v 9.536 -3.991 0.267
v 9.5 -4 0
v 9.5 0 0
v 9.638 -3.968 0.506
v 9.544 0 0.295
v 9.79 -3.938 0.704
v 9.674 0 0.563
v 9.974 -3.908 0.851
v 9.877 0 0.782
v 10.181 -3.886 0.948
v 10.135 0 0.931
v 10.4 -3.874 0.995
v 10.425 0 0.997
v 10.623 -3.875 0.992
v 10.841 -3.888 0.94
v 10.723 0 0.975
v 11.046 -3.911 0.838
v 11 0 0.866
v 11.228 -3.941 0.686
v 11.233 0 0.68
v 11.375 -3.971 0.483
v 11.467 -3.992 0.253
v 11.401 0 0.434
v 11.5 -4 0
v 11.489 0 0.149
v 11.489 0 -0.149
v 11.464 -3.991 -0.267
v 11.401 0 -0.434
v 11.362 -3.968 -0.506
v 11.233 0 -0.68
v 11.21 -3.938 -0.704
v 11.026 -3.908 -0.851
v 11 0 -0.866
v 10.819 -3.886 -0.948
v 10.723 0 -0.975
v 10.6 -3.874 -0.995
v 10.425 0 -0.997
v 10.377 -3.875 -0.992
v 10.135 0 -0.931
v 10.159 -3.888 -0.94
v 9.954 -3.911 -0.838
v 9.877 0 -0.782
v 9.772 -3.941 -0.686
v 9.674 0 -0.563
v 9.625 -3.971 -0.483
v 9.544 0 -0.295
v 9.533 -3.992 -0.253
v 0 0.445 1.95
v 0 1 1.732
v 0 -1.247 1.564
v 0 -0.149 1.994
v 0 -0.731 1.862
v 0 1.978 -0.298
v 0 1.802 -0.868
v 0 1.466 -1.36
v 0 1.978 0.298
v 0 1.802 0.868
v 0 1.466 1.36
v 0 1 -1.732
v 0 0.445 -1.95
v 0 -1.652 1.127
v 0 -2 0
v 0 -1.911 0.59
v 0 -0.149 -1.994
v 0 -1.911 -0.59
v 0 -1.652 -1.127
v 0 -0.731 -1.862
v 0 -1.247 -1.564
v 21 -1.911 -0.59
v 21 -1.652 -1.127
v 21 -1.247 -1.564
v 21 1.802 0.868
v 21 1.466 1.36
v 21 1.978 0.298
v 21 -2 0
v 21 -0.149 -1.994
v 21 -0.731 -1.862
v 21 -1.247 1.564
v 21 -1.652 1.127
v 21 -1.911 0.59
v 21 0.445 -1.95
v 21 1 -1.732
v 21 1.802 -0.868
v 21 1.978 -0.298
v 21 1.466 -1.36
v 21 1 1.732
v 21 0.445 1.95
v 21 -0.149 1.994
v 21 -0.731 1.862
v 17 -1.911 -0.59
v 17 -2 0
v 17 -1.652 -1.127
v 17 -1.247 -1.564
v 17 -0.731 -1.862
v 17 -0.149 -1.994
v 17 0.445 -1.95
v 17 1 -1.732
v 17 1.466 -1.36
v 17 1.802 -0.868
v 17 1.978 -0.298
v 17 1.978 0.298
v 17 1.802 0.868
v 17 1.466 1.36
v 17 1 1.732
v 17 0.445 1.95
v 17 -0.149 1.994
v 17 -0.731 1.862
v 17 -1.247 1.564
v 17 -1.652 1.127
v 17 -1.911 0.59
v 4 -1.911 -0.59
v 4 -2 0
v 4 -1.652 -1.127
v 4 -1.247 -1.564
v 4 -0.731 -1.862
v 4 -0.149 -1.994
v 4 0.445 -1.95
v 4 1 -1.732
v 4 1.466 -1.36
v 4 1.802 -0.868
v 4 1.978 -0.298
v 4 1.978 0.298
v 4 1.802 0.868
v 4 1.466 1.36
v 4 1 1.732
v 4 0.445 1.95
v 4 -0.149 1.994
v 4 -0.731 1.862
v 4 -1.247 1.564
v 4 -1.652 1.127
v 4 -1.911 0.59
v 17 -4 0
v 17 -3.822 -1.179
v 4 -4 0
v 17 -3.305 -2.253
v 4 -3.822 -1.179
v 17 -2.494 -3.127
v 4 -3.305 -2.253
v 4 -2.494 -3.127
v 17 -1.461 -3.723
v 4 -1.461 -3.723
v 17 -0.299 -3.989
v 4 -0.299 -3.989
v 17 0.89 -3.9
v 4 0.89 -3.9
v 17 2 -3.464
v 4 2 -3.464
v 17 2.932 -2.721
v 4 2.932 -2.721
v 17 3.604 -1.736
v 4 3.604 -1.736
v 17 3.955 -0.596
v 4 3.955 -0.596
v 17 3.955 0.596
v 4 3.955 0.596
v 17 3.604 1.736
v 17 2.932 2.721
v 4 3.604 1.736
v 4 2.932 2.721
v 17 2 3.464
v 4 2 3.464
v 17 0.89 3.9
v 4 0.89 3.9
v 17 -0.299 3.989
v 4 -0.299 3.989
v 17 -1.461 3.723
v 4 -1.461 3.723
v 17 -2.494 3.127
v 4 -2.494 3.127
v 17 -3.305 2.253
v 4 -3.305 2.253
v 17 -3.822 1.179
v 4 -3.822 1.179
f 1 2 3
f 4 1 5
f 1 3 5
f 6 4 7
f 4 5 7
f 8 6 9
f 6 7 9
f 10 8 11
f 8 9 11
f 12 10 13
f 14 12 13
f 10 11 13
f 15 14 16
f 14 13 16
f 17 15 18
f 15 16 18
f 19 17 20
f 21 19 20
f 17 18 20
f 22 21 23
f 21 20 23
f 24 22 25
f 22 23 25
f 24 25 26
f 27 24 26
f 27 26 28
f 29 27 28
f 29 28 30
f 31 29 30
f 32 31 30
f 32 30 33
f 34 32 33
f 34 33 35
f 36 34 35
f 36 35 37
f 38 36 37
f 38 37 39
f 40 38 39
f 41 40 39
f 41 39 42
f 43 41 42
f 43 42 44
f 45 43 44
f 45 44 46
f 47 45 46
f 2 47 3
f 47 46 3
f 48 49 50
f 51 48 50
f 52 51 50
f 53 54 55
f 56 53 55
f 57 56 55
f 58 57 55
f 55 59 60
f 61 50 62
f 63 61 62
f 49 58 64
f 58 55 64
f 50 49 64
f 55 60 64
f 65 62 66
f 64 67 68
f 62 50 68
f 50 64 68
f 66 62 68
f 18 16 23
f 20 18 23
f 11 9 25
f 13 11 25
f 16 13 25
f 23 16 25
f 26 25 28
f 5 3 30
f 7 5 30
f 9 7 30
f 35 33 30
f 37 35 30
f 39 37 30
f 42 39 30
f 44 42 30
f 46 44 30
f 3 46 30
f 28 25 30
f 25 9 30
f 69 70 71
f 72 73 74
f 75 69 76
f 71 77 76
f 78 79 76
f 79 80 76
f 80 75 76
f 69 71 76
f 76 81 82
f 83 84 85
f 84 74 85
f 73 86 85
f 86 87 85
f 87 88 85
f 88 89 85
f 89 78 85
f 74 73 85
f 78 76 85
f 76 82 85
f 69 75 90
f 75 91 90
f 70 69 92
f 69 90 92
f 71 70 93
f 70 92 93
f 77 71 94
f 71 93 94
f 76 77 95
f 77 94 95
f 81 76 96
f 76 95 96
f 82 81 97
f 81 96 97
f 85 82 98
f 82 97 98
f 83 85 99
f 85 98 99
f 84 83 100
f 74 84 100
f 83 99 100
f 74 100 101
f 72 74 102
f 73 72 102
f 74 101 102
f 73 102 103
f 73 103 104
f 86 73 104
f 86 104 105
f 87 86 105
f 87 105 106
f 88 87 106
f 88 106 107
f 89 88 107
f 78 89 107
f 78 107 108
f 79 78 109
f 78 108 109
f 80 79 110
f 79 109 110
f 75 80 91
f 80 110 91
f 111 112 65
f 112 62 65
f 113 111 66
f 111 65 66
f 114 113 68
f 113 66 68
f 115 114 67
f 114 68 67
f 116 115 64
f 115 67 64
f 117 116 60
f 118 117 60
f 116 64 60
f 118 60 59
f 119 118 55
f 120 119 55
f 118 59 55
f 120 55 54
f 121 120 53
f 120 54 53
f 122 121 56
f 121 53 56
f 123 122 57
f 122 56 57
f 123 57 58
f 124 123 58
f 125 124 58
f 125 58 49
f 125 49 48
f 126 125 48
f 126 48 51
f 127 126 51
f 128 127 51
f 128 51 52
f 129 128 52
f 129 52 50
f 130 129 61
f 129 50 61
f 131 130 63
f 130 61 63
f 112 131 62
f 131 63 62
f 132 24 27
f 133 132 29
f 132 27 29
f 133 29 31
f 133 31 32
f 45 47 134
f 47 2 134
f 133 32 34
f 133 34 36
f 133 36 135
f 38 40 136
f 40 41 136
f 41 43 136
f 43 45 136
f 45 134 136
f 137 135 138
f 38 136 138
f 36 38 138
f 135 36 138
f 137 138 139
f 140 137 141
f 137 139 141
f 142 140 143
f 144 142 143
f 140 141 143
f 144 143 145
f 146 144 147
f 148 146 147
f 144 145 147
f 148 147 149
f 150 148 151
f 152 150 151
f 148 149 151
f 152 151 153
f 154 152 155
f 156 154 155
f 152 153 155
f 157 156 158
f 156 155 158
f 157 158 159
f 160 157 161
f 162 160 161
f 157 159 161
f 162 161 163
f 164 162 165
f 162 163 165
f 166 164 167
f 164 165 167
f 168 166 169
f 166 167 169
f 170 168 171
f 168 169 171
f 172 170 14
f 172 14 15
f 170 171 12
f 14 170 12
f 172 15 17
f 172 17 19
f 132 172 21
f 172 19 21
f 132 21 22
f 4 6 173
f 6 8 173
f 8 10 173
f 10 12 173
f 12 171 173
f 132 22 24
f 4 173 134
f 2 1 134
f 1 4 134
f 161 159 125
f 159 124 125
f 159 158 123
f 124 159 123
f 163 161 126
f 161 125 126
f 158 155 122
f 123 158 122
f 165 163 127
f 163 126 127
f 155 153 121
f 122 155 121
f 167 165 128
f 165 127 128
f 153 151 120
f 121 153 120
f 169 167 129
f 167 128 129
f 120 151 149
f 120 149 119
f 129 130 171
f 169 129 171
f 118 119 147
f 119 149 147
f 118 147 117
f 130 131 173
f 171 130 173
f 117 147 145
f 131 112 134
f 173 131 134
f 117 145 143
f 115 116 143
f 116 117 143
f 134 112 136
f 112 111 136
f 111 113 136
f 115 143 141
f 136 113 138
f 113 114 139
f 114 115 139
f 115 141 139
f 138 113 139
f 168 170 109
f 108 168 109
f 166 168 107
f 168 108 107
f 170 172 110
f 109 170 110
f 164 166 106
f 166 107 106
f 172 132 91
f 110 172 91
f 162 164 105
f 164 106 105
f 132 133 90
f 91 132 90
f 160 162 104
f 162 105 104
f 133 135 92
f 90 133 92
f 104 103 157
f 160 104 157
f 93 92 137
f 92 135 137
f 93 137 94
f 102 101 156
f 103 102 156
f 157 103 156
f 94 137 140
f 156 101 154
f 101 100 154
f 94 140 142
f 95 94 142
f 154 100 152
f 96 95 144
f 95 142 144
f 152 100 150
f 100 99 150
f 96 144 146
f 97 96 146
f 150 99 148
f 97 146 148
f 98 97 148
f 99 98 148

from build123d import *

# Parameters (mm, degrees)
CUT_EXTRUDE_1_DEPTH = 30


with BuildPart() as part:
    # 草图1 → 旋转2 (revolve)
    with BuildSketch(Plane.XY, mode=Mode.PRIVATE) as revolve_2_sk:
        Polygon((0, 2), (0, 0), (17, 0), (21, 0), (21, 2), (17, 2), (17, 4), (4, 4), (4, 2), align=None)
    revolve(revolve_2_sk.sketch.rotate(Axis((-16.701754386, 0, 0), (1, 0, 0)), 180), axis=Axis((-16.701754386, 0, 0), (1, 0, 0)))

    # 草图2 → 切除-拉伸1 (cut)
    with BuildSketch(Plane(origin=(0, 0, 0), x_dir=(1, 0, 0), z_dir=(0, 1, 0))):
        with BuildLine():
            ThreePointArc((11.5, 0), (10.5, 1), (9.5, 0))
            Line((9.5, 0), (11.5, 0))
        make_face()
        with BuildLine():
            Line((11.5, 0), (9.5, 0))
            ThreePointArc((9.5, 0), (10.5, -1), (11.5, 0))
        make_face()
    extrude(amount=-CUT_EXTRUDE_1_DEPTH, mode=Mode.SUBTRACT)


solid = part.part
